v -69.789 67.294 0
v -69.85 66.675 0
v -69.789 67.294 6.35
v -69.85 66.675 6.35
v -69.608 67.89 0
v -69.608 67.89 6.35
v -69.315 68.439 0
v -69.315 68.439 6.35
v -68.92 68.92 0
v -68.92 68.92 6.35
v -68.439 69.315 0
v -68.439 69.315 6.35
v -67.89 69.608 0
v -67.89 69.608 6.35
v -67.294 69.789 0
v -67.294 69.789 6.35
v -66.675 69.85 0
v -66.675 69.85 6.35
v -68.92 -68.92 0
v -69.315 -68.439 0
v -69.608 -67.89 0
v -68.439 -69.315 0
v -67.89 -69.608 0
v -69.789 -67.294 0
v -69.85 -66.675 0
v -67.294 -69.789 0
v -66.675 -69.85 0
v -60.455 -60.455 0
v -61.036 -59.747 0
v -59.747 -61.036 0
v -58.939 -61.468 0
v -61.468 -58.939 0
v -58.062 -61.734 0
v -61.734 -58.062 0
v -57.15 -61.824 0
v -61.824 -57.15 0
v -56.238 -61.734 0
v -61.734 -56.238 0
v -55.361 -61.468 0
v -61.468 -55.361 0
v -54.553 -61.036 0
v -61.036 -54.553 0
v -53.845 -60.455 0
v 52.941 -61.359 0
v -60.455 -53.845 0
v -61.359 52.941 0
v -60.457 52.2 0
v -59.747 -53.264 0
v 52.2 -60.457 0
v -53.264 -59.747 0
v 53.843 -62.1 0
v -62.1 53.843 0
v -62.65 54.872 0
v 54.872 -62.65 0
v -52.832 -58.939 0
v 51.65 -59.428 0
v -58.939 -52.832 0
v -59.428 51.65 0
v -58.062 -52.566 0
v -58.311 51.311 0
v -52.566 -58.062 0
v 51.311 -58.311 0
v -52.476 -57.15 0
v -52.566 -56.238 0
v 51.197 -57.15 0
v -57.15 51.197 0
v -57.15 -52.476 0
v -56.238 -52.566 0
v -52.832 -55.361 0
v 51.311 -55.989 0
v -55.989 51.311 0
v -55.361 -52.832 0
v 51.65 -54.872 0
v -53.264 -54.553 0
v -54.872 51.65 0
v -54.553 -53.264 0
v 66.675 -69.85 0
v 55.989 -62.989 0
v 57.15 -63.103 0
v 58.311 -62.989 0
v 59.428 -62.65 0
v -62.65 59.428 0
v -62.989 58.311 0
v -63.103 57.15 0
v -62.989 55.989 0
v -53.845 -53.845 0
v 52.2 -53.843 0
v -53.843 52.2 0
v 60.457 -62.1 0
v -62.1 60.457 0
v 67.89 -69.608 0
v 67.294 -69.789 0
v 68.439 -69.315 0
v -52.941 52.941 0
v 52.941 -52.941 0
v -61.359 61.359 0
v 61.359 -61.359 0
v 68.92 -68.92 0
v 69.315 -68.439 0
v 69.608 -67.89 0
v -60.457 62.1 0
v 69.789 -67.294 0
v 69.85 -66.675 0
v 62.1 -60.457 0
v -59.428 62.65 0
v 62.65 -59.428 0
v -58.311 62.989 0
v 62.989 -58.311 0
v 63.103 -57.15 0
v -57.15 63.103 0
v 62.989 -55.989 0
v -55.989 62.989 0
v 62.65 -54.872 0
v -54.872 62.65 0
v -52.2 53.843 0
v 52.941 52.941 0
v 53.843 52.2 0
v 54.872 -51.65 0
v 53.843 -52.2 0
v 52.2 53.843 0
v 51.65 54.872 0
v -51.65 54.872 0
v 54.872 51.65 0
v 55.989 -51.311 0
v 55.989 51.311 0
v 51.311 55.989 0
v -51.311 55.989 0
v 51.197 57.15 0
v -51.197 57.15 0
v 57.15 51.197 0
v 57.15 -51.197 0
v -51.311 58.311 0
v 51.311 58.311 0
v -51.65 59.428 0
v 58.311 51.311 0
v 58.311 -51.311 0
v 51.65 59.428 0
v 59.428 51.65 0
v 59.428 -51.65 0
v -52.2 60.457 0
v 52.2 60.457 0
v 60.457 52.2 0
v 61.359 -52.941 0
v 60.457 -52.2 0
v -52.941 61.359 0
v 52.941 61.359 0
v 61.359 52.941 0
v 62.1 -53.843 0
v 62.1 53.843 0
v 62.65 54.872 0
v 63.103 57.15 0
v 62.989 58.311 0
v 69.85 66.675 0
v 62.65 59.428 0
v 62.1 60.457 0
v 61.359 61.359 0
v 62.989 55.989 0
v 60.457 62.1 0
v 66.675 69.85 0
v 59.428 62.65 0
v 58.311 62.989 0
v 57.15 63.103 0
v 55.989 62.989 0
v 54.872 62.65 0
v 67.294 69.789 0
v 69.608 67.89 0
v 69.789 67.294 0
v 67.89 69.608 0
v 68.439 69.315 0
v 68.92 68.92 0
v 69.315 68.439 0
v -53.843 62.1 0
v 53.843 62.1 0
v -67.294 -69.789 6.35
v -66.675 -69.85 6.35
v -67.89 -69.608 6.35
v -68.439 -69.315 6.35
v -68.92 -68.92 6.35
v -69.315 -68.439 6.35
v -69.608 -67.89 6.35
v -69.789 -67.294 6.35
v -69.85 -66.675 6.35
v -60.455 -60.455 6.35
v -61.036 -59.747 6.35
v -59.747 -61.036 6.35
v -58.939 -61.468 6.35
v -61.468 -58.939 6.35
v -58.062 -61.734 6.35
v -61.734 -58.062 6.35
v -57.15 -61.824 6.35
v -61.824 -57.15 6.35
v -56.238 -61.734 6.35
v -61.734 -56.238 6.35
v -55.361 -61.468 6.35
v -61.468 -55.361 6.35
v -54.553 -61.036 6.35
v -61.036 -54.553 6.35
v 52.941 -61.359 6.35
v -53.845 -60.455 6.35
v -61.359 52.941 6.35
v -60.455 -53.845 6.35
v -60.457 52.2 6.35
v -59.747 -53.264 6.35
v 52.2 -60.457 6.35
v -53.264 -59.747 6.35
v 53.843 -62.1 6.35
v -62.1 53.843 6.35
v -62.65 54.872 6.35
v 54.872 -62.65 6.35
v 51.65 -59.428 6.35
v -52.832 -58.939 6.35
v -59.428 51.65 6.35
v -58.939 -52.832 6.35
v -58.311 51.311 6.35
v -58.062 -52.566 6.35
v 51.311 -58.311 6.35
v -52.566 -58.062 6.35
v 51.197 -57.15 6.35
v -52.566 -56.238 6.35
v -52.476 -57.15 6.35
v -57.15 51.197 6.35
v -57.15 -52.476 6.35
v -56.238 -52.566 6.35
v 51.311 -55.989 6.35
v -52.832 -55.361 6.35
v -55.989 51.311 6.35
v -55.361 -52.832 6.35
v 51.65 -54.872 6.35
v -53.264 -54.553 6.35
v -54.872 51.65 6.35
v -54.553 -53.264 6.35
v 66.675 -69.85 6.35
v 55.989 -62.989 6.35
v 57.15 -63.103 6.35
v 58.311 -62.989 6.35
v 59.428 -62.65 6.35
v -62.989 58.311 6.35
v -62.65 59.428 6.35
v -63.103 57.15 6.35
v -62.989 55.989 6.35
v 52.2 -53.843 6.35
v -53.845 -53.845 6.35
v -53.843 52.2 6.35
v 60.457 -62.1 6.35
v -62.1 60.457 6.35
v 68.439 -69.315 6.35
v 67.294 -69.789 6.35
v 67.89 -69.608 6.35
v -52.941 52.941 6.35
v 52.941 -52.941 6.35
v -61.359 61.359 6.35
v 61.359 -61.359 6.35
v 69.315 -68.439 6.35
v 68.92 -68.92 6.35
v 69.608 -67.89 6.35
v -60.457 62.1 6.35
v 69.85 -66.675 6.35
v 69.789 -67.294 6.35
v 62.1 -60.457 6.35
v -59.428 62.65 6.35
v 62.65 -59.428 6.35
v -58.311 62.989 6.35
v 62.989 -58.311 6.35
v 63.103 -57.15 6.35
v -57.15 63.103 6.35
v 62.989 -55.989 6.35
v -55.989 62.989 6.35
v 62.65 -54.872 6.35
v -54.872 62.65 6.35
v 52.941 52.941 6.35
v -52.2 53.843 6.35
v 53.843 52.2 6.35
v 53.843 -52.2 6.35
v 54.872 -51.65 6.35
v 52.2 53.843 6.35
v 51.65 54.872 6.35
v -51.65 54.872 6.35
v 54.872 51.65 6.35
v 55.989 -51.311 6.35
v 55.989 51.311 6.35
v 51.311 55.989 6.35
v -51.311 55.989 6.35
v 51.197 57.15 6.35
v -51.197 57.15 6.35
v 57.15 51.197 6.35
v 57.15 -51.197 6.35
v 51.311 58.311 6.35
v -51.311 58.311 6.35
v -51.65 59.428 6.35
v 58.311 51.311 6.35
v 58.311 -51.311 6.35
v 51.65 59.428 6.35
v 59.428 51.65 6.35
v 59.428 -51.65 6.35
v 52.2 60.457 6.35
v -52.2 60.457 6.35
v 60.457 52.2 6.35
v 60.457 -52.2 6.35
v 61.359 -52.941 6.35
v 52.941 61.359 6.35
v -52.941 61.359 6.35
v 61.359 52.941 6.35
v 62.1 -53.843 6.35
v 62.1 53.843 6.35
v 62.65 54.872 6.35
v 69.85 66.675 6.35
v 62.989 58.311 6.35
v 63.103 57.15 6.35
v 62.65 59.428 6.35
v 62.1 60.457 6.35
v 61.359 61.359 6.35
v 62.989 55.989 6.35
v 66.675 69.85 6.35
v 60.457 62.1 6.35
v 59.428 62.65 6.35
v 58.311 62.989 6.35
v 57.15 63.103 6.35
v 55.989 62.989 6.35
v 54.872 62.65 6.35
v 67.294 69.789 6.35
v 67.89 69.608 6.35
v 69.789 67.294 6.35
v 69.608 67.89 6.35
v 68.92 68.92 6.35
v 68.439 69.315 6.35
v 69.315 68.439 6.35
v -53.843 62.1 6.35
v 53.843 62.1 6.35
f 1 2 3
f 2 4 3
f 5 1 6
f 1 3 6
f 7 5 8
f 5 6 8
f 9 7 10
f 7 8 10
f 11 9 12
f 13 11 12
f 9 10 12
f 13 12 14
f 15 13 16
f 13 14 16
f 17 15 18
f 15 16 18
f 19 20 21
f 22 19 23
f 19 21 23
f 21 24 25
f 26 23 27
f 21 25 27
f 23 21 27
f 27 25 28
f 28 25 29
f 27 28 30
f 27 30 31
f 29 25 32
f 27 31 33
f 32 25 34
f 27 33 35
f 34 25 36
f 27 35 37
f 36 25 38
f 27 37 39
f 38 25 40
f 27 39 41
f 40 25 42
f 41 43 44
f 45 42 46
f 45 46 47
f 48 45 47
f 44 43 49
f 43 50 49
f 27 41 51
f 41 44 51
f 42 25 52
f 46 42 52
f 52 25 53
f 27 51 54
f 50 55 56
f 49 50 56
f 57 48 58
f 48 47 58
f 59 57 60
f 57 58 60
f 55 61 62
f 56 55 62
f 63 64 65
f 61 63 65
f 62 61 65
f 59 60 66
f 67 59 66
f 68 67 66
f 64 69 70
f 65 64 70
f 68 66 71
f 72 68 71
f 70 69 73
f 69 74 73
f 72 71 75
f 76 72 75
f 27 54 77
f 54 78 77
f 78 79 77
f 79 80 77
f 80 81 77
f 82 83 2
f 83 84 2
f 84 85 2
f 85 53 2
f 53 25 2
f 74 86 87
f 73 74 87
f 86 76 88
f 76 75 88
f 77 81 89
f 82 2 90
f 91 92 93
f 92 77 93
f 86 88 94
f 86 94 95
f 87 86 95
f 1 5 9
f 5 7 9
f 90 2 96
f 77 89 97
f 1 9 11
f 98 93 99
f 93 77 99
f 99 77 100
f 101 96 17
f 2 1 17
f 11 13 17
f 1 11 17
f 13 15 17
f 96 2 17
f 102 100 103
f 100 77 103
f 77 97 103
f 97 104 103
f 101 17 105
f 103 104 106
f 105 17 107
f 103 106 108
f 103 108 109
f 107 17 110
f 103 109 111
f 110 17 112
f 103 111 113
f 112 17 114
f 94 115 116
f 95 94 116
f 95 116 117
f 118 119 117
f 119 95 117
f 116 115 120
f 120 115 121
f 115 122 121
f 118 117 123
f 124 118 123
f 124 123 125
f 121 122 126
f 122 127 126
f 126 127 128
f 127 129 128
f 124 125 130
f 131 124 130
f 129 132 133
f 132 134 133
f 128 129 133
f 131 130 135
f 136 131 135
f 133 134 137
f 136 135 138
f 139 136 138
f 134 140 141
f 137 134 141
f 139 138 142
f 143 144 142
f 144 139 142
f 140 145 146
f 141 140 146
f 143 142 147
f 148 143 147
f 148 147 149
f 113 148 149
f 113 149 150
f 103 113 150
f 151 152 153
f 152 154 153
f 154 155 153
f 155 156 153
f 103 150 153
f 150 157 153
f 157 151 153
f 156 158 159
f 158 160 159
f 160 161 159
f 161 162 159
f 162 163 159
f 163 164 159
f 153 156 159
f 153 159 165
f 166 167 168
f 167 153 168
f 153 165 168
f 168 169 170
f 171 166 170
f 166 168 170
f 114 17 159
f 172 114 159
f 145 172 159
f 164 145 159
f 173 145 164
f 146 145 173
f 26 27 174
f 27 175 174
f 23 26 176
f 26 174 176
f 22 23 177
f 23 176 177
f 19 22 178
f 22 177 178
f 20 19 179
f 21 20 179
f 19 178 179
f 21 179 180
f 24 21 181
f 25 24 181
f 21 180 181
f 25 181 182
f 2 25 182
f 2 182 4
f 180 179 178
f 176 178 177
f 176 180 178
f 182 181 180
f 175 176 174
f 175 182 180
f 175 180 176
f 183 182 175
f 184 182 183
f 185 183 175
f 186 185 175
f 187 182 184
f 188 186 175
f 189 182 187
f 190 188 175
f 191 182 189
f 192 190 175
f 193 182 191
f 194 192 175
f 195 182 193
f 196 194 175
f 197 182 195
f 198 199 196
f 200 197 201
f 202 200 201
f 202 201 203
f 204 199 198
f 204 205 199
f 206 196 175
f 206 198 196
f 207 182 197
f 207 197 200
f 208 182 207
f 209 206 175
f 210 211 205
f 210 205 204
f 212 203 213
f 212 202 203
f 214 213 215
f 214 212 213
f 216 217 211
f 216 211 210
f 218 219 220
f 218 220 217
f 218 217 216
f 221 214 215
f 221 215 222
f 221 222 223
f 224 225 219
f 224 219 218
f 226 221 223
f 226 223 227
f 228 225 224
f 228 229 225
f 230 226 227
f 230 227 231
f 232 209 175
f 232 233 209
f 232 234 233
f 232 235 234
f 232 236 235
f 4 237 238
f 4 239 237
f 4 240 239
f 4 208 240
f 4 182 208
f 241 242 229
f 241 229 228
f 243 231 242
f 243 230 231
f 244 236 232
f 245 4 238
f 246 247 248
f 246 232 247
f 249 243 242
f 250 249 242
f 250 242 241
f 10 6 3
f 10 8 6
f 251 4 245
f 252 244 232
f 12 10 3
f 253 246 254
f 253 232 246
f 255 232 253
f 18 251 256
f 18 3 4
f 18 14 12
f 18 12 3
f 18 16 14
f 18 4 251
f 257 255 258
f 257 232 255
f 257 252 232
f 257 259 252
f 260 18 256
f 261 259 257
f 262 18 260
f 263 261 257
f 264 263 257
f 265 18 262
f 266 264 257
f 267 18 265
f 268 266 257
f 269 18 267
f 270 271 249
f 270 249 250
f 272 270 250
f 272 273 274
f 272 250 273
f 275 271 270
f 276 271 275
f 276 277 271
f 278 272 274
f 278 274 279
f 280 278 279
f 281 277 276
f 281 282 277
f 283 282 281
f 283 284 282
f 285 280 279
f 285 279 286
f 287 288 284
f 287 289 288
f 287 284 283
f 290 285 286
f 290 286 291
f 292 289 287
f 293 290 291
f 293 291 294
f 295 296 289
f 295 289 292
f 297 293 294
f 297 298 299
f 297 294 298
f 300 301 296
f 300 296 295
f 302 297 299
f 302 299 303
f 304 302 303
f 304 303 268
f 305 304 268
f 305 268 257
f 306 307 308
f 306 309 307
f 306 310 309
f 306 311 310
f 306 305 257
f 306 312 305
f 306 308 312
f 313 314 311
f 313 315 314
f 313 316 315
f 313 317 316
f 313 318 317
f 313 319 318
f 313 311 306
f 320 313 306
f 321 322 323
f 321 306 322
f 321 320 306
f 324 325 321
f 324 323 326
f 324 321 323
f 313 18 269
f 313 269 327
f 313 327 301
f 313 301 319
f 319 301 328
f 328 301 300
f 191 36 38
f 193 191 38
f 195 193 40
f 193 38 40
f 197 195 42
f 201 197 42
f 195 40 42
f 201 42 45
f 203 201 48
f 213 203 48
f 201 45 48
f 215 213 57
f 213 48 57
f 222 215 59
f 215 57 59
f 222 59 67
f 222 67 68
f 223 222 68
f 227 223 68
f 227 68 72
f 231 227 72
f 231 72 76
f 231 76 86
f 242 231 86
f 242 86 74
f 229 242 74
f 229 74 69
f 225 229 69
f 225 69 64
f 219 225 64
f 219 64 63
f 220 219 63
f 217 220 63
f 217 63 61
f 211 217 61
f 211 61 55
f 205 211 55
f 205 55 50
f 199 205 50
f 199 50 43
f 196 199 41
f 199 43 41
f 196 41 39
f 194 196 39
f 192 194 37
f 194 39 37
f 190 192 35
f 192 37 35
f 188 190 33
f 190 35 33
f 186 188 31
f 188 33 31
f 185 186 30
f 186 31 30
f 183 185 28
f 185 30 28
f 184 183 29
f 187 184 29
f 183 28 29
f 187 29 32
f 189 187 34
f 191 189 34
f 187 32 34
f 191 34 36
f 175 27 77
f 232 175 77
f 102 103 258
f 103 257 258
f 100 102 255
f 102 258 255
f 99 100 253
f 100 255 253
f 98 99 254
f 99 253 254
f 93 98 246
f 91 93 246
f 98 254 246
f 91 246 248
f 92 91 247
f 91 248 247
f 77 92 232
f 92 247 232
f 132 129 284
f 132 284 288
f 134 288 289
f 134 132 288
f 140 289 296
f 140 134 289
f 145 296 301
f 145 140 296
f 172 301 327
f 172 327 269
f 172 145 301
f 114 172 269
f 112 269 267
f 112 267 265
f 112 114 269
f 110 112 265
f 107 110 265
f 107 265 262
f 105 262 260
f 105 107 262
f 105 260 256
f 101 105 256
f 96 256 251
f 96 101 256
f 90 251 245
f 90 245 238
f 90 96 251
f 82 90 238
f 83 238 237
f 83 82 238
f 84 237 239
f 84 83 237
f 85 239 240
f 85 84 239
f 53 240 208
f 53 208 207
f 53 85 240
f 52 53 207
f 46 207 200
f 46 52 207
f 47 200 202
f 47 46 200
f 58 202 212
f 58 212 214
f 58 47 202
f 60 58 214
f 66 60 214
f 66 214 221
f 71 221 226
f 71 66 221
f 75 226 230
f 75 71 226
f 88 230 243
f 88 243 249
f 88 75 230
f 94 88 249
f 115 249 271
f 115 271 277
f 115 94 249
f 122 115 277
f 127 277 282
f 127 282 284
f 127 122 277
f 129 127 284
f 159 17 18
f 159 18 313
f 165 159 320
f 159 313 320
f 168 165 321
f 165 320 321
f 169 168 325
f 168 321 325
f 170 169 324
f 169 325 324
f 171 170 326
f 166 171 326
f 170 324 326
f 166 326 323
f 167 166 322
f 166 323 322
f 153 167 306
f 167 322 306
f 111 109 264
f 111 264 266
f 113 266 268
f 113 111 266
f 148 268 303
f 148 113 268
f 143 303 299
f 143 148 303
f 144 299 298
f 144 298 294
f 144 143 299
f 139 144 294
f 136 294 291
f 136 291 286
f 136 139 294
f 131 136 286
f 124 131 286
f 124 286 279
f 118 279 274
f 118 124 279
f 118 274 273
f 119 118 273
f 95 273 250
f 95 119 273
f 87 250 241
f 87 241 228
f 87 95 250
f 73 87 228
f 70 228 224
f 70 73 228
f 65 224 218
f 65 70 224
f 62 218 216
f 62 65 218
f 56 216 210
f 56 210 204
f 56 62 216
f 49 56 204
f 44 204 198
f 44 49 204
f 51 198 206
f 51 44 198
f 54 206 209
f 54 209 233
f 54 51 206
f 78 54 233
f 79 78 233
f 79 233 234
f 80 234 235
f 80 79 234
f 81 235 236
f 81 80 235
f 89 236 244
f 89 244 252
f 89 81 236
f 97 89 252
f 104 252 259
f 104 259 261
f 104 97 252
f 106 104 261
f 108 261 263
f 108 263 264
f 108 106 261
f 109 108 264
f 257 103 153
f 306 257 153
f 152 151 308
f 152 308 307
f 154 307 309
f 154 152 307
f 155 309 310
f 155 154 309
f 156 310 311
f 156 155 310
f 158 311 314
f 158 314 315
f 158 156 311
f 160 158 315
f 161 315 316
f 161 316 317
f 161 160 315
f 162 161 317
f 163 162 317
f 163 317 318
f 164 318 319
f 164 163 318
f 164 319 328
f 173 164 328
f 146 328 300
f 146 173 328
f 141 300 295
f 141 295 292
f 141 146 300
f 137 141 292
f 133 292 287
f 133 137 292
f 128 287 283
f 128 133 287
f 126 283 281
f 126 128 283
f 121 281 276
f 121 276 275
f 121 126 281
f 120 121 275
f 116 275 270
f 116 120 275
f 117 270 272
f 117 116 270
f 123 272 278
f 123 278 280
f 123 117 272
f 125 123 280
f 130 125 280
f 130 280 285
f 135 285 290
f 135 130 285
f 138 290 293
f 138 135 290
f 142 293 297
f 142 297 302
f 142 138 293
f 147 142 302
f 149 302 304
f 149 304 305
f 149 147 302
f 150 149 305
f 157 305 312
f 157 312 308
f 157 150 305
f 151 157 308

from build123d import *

# Parameters (mm, degrees)
F0_W     = 139.7
F0_H     = 139.7
F0_R     = 5.953125
F1_DEPTH = 6.35
F3_D     = 9.3472
F4_R     = 3.175
F5_R     = 3.175
F6_R     = 3.175
F7_R     = 3.175


with BuildPart() as f1:
    # F0 (on Top) → F1 (new body)
    with BuildSketch(Plane.XY):
        Rectangle(F0_W, F0_H)
        with Locations((-57.15, -57.15)):
            Circle(F0_R, mode=Mode.SUBTRACT)
        with Locations((57.15, -57.15)):
            Circle(F0_R, mode=Mode.SUBTRACT)
        with Locations((-57.15, 57.15)):
            Circle(F0_R, mode=Mode.SUBTRACT)
        with Locations((57.15, 57.15)):
            Circle(F0_R, mode=Mode.SUBTRACT)
        with Locations((-57.15, -57.15)):
            Circle(F0_R)
    extrude(amount=F1_DEPTH)

    # F3 (through all)
    with Locations(Plane.XY.offset(6.35)):
        with Locations((-57.15, -57.15)):
            Hole(F3_D / 2)

    # F4
    f4_edges = [f1.edges().sort_by_distance(p)[0] for p in [
        (-69.85, 69.85, 3.175),
    ]]
    fillet(f4_edges, radius=F4_R)

    # F5
    f5_edges = [f1.edges().sort_by_distance(p)[0] for p in [
        (69.85, 69.85, 3.175),
    ]]
    fillet(f5_edges, radius=F5_R)

    # F6
    f6_edges = [f1.edges().sort_by_distance(p)[0] for p in [
        (69.85, -69.85, 3.175),
    ]]
    fillet(f6_edges, radius=F6_R)

    # F7
    f7_edges = [f1.edges().sort_by_distance(p)[0] for p in [
        (-69.85, -69.85, 3.175),
    ]]
    fillet(f7_edges, radius=F7_R)


solid = f1.part
